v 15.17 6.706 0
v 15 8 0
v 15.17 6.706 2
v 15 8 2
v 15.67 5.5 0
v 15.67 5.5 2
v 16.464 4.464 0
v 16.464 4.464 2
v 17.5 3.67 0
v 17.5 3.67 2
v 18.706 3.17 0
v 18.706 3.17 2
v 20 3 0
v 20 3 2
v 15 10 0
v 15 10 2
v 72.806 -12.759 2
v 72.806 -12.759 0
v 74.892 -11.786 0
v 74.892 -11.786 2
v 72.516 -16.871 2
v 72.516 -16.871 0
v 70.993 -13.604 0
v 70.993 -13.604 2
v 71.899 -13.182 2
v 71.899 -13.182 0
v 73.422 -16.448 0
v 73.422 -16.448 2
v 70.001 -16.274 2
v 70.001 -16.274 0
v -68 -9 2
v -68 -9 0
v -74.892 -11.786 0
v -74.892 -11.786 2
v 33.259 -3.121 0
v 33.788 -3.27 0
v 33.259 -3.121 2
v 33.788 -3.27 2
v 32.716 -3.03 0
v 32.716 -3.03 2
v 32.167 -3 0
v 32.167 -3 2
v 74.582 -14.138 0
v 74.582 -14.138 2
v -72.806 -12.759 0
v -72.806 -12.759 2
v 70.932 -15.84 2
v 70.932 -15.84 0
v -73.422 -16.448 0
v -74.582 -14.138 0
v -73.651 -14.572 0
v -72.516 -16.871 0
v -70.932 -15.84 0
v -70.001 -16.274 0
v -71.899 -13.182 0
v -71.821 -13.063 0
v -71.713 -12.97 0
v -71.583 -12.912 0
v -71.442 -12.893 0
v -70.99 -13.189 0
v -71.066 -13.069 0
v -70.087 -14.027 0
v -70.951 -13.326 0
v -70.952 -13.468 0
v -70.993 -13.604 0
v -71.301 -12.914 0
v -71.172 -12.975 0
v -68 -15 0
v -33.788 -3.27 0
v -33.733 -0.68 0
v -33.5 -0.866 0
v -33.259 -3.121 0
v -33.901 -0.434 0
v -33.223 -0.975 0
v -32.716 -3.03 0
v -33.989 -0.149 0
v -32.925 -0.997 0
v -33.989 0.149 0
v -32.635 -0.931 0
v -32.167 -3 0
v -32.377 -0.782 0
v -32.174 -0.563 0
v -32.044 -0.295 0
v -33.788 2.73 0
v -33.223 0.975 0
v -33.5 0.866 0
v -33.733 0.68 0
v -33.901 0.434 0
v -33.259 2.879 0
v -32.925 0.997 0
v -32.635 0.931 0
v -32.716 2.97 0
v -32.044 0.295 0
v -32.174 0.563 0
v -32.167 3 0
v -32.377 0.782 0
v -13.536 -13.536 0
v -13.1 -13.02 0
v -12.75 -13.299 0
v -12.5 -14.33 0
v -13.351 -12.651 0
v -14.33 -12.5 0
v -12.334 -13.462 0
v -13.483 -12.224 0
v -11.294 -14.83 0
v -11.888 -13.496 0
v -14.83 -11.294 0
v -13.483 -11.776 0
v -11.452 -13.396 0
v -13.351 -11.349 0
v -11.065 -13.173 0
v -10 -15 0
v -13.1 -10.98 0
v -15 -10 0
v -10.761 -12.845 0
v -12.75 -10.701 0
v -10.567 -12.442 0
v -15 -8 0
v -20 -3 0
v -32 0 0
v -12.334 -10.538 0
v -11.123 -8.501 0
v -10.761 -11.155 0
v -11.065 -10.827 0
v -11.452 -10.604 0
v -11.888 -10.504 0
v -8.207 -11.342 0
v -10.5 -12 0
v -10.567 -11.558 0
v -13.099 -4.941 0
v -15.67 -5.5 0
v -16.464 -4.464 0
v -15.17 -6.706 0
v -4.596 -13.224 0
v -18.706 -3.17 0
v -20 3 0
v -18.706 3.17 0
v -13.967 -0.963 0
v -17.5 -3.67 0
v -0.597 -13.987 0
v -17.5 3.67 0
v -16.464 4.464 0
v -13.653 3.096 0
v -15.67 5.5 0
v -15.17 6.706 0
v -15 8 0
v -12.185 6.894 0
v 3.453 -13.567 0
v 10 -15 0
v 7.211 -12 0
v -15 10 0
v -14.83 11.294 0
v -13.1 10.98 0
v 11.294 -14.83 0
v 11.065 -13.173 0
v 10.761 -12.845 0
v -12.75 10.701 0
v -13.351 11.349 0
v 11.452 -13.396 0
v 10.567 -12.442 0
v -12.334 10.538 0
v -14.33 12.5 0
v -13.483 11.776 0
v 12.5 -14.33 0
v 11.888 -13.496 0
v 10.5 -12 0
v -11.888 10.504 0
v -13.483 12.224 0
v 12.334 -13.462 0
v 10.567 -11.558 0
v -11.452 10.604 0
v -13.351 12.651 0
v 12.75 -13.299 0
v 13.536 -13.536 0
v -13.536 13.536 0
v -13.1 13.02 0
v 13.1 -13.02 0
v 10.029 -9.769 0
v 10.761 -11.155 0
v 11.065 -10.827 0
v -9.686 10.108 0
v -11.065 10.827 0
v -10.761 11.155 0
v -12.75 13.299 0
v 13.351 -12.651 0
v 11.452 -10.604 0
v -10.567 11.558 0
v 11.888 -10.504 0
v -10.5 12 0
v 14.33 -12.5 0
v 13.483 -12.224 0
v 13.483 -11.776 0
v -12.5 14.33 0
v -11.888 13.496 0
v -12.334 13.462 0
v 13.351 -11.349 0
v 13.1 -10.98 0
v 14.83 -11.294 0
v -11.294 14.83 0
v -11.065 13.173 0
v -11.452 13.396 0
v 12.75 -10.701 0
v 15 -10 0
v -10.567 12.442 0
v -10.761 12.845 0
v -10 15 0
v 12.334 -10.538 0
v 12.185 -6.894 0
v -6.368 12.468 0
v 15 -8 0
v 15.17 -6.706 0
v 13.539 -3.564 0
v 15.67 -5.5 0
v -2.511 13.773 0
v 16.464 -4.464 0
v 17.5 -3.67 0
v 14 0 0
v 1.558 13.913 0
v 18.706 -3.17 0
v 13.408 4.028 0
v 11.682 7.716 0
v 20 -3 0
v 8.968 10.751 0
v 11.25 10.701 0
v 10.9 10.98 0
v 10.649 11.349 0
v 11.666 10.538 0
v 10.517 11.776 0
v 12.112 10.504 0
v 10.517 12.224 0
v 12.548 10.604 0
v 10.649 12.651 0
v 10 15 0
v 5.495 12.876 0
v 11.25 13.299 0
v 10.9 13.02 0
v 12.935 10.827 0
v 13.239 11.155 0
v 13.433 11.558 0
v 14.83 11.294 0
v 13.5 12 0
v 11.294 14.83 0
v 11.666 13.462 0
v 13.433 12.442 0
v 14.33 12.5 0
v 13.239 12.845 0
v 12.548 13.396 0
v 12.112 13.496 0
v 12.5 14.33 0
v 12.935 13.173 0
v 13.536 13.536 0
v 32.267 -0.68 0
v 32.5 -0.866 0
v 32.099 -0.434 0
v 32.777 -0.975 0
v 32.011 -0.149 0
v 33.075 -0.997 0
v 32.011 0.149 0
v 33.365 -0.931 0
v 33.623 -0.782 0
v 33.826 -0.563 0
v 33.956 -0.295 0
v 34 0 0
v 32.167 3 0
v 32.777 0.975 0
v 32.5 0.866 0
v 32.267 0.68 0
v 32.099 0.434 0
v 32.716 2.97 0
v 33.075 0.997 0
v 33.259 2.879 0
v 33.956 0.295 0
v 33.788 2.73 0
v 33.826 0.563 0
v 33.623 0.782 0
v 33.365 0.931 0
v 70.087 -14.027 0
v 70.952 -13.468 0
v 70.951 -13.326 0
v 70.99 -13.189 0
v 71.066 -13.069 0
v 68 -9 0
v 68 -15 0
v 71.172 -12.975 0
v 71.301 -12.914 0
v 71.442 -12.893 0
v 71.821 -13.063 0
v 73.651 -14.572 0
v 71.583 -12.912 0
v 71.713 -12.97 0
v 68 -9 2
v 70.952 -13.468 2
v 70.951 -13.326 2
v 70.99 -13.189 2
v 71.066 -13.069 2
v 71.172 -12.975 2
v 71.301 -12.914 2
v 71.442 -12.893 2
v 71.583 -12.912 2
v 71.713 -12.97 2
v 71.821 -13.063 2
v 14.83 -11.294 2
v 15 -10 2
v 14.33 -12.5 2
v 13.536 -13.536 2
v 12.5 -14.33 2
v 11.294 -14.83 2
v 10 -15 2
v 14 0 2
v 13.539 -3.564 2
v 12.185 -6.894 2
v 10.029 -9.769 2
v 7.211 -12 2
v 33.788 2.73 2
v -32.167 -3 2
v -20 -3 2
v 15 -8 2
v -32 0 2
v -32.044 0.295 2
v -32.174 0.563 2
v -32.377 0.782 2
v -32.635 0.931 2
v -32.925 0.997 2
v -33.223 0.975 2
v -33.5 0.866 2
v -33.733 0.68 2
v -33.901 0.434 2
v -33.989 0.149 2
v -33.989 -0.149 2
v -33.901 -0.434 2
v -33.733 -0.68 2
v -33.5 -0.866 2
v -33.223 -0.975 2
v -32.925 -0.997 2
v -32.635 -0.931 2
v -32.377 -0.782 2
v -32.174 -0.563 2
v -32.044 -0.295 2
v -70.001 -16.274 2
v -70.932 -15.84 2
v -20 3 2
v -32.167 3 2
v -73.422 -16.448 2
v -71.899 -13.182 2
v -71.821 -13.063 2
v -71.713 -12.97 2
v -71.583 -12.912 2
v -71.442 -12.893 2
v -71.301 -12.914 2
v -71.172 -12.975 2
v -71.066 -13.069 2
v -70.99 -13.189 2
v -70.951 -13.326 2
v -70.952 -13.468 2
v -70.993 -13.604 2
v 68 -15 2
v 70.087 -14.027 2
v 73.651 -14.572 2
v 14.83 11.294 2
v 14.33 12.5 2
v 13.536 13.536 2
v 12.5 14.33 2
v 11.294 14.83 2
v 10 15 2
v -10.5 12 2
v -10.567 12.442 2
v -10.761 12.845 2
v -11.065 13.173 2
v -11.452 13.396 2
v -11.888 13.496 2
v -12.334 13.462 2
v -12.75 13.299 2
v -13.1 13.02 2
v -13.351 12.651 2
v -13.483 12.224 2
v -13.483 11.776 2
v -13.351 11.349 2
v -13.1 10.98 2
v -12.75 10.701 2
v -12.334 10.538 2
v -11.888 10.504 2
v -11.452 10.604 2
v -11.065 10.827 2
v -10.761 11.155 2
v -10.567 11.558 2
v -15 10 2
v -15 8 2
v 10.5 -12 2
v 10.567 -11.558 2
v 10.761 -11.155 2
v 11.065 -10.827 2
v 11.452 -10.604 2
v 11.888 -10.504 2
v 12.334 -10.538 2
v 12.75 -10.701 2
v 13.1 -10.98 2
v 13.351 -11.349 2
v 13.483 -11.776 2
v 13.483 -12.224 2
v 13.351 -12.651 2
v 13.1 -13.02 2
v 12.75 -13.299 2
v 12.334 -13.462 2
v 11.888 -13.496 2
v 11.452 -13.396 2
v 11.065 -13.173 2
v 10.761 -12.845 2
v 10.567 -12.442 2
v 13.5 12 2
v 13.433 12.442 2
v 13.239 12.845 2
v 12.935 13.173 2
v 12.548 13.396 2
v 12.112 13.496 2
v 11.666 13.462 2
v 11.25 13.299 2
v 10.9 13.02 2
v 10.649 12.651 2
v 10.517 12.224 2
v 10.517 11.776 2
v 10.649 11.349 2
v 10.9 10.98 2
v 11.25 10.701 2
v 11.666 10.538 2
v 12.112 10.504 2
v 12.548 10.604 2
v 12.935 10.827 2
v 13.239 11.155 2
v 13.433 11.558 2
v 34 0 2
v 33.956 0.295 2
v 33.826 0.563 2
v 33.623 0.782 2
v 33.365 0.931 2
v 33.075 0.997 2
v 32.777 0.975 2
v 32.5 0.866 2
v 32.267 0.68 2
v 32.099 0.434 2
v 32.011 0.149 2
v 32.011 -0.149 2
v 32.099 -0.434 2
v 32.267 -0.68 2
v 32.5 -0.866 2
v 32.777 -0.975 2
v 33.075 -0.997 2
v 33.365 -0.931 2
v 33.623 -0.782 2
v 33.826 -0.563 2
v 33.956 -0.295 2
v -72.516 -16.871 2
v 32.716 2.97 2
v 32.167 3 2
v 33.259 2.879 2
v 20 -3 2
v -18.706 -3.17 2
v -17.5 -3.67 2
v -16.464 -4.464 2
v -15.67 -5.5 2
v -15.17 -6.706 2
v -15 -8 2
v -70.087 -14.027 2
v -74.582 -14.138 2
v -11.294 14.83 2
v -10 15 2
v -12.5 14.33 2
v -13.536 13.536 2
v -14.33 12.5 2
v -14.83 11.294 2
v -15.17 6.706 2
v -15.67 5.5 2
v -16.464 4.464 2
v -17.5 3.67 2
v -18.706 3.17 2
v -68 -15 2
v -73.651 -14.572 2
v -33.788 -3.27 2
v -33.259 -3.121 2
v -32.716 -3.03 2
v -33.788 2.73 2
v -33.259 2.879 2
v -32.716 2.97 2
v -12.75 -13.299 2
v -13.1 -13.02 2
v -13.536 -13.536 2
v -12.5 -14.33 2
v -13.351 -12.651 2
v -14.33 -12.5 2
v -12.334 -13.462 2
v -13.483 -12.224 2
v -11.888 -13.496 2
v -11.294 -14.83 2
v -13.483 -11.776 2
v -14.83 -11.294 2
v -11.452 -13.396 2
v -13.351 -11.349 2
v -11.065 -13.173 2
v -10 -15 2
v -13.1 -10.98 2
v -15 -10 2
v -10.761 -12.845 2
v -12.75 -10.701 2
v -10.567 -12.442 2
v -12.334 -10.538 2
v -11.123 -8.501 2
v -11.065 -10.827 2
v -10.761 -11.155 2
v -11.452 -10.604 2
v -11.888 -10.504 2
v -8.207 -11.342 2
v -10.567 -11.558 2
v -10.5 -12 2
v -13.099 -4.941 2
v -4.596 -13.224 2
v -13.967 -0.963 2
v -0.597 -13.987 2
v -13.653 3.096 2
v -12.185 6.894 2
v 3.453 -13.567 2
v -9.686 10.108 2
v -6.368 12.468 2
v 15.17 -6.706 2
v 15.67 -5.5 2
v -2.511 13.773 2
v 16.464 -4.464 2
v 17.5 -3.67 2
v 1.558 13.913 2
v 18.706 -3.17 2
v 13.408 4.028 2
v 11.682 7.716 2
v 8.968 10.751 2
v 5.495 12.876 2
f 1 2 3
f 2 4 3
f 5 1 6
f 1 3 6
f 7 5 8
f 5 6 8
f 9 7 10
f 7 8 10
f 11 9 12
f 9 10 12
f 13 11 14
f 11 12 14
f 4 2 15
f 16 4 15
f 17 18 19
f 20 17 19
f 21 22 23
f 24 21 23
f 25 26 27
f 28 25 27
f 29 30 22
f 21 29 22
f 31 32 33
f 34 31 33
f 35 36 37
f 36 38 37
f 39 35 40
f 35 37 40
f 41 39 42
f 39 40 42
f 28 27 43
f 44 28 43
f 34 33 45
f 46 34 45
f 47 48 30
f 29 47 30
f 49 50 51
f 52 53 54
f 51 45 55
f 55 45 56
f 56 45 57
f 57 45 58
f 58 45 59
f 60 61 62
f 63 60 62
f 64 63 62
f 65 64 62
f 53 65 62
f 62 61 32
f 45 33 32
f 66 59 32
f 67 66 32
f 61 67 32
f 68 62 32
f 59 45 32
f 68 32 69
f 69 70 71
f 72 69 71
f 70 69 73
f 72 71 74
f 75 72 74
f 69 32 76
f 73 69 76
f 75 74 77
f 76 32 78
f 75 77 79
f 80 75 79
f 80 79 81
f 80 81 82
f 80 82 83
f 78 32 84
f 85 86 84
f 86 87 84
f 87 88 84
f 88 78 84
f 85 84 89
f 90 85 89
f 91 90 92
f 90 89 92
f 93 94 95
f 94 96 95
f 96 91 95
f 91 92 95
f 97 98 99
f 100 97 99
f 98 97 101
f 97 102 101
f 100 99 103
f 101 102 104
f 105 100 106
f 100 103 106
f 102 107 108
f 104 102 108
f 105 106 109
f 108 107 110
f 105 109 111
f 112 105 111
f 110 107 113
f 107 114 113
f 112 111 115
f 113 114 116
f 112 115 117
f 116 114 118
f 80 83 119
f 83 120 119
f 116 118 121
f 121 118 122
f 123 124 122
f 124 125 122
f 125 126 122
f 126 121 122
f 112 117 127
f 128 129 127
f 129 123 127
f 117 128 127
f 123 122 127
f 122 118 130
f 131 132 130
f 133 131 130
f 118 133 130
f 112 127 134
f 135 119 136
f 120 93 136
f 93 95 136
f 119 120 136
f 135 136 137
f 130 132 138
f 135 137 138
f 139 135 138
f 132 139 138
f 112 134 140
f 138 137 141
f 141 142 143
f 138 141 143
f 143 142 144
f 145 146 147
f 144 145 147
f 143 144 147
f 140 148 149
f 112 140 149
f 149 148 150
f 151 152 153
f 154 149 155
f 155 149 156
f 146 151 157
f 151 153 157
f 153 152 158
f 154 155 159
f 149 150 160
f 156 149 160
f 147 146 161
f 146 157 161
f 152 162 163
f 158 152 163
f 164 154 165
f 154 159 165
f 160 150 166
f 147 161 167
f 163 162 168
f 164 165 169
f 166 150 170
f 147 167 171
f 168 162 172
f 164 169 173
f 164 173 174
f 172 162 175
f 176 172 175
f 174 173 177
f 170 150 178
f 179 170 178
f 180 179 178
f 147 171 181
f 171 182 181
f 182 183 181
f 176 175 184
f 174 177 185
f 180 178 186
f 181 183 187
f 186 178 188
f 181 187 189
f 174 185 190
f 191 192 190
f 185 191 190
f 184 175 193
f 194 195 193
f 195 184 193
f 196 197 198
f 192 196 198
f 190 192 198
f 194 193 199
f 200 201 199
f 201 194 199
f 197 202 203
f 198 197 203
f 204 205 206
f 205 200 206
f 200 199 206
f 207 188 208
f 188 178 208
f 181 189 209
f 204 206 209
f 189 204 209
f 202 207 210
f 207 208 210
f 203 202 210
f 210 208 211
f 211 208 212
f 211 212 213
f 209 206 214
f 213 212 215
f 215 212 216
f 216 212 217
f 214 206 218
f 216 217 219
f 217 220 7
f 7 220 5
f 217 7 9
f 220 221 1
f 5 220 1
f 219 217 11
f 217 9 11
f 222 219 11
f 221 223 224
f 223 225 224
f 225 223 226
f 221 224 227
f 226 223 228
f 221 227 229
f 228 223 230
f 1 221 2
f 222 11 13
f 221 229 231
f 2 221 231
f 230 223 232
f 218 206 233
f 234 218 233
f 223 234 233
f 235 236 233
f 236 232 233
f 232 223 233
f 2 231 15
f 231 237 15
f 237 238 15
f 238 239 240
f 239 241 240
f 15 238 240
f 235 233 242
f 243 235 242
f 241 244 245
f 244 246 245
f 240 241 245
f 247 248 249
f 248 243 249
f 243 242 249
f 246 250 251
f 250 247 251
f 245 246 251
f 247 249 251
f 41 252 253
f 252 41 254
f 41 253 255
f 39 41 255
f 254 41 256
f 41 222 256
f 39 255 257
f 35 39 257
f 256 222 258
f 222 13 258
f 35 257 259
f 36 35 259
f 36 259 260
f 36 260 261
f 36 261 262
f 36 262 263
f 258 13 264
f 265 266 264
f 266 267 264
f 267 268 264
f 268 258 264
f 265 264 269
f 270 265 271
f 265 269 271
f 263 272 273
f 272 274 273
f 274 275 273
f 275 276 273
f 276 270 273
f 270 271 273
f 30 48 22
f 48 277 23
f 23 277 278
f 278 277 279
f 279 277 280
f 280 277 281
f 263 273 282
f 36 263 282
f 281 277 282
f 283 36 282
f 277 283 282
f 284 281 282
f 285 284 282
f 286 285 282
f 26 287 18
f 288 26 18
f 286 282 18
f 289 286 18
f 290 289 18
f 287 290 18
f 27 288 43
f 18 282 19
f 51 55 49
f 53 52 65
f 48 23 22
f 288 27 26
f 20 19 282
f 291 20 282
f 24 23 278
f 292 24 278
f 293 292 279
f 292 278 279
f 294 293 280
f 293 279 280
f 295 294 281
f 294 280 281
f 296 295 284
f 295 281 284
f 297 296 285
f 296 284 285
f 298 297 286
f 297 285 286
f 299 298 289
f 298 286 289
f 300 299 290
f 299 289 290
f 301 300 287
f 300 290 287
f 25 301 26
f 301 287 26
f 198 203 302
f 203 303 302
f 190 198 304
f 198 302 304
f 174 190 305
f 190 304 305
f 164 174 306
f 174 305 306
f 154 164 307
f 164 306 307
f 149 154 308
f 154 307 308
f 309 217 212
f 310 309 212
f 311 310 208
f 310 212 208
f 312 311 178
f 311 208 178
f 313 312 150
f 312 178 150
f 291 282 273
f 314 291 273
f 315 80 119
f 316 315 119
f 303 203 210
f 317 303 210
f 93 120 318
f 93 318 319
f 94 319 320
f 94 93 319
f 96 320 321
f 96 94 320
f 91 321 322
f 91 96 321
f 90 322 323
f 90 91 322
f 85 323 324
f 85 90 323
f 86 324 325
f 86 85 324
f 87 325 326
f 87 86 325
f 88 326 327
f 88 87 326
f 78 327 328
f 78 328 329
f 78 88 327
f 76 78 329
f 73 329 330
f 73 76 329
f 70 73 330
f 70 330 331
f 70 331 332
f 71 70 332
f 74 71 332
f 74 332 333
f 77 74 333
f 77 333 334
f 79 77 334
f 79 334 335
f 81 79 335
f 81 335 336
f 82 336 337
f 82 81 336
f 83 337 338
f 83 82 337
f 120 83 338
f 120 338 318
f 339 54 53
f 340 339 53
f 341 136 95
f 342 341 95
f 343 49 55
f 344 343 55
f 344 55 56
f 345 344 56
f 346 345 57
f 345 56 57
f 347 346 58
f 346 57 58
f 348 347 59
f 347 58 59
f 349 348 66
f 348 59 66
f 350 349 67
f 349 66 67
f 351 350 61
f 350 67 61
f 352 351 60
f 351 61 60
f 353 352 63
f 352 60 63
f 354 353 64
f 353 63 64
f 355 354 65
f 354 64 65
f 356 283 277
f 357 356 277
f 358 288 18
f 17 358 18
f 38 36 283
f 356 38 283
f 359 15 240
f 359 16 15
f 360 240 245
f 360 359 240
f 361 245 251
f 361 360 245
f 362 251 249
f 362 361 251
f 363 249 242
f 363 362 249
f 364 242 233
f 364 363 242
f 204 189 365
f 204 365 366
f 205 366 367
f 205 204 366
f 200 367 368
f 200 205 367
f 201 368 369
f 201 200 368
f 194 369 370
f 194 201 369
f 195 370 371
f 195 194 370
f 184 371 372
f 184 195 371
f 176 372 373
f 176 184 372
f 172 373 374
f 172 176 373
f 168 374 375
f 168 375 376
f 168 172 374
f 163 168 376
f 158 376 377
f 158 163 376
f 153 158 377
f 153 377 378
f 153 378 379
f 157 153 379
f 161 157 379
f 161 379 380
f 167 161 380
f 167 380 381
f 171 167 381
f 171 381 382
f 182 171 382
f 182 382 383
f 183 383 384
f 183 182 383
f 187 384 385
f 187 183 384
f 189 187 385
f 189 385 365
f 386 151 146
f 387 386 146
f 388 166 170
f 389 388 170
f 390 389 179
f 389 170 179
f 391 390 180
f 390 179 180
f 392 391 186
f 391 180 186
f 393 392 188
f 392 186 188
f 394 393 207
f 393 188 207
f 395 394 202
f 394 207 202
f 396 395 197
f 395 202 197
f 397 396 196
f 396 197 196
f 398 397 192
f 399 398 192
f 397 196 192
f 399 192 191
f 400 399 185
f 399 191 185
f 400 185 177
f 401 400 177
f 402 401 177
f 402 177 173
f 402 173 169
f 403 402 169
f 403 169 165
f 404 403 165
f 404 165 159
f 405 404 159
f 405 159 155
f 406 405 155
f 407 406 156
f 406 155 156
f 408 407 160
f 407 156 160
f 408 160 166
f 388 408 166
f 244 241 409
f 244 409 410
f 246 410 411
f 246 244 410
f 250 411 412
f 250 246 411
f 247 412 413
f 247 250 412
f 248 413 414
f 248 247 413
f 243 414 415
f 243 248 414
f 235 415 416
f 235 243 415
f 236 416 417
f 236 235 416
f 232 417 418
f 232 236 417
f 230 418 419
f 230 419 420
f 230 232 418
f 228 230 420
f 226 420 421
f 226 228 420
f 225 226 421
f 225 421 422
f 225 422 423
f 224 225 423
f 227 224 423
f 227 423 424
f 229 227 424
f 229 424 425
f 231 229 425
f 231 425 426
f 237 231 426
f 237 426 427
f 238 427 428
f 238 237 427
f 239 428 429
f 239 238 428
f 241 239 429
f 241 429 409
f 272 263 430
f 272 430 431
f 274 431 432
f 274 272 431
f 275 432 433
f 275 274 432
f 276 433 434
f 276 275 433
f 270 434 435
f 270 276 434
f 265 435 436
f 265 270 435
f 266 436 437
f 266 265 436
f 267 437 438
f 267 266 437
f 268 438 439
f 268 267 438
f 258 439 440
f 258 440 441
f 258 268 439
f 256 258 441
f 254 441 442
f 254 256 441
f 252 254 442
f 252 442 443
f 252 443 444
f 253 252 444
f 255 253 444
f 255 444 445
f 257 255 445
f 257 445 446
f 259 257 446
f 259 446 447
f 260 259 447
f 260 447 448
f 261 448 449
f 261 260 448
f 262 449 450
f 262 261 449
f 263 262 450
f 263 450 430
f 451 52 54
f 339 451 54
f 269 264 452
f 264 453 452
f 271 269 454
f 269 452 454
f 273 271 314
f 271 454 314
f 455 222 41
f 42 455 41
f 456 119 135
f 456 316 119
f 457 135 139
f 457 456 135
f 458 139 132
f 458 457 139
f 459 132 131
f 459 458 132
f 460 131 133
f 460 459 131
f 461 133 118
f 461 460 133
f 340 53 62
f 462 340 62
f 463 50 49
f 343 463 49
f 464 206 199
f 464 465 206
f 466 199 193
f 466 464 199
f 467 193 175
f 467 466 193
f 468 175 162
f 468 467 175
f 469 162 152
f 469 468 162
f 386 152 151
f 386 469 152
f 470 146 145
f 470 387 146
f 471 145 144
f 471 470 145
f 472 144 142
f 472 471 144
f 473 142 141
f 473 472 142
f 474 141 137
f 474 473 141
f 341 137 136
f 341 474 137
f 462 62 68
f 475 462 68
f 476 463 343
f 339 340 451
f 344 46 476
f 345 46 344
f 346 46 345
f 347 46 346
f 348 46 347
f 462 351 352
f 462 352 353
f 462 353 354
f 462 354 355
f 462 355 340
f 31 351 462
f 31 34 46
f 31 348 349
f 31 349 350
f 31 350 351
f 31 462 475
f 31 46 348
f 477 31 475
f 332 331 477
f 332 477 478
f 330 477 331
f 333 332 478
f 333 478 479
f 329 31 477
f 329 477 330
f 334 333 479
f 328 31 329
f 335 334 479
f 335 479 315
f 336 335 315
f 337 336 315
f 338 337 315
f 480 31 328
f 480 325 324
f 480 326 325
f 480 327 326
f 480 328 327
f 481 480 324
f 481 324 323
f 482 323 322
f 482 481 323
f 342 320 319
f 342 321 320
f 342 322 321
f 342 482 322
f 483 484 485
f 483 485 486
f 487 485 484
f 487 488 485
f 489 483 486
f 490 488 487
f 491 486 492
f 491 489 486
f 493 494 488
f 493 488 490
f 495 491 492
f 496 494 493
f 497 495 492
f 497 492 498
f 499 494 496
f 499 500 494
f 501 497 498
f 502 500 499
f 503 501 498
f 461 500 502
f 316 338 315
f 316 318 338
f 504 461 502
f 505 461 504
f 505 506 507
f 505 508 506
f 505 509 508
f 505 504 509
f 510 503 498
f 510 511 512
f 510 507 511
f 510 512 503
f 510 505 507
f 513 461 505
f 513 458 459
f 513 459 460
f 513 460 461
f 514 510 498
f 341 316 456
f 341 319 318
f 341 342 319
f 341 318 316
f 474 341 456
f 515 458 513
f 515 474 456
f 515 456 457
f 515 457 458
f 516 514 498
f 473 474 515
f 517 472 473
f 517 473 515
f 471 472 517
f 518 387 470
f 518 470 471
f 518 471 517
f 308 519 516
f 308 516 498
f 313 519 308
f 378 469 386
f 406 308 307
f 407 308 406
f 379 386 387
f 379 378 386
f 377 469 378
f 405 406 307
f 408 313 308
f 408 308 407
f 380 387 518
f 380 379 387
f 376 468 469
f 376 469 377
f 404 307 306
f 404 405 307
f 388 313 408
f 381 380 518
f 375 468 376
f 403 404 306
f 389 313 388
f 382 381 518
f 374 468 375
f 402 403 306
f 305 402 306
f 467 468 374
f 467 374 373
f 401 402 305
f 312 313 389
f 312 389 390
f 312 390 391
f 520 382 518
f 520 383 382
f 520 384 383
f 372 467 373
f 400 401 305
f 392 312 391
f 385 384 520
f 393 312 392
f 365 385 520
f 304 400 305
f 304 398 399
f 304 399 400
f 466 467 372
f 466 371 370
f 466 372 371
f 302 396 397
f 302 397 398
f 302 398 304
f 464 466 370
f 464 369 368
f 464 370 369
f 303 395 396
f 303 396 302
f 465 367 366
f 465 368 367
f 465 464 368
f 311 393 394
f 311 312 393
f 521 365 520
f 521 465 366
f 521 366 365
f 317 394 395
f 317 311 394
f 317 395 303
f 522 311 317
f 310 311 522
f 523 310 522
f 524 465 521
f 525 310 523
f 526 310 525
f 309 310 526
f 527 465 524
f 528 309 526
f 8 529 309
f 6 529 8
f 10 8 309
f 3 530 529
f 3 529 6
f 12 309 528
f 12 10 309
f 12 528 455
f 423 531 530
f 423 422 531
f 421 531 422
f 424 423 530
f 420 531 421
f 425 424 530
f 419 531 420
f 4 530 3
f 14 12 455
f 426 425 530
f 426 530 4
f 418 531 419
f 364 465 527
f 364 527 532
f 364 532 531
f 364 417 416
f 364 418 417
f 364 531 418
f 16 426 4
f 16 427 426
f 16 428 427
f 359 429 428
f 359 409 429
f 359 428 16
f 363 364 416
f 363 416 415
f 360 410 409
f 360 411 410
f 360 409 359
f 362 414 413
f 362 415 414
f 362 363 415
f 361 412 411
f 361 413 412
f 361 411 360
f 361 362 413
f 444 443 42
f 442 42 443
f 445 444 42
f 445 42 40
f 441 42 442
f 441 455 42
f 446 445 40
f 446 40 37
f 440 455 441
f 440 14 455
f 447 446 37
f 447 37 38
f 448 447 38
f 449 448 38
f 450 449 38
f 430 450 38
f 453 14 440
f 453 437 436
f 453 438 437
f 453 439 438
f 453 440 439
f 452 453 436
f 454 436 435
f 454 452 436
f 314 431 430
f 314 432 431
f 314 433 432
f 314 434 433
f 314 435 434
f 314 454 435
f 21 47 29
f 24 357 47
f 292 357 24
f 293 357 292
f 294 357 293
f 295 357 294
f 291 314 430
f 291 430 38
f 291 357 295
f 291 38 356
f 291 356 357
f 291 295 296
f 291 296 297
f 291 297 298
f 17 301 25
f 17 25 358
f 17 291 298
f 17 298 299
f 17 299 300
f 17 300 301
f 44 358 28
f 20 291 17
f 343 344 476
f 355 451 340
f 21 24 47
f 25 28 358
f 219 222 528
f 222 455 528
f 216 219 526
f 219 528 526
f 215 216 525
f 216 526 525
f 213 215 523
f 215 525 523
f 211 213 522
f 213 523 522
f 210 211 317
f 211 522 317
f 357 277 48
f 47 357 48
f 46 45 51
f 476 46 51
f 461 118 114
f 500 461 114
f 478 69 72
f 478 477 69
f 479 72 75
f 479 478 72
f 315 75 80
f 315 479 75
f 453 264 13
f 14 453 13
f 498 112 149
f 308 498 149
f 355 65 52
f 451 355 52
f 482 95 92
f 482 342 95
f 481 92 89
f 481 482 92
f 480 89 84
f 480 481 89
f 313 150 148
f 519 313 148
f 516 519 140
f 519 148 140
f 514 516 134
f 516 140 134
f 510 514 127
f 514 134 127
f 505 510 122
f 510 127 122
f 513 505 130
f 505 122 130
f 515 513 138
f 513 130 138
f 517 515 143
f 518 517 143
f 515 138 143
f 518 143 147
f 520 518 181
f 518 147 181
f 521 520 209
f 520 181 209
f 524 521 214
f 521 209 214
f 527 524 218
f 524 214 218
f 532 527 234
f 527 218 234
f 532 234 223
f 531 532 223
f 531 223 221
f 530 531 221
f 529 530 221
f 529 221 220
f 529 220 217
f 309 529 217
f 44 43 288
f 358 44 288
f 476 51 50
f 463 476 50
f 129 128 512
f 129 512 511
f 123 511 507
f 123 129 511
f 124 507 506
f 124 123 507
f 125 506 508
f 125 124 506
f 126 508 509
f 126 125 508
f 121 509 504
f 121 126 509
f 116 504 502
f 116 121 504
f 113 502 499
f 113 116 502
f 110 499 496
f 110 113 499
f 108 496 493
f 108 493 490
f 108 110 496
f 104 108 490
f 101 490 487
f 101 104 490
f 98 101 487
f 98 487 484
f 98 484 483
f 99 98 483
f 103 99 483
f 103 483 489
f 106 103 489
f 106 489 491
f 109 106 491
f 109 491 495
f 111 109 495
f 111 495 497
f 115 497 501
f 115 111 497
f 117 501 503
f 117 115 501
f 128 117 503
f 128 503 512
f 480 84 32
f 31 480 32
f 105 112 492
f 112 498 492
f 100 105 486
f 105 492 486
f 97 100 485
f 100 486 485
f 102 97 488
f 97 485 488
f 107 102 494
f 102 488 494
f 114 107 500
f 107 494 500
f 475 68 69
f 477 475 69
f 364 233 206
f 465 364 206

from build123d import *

# Parameters (mm, degrees)
F0_R     = 1.5
F0_R_2   = 1
F1_DEPTH = 2
F2_R     = 5


with BuildPart() as f1:
    # F0 (on Top) → F1 (new body)
    with BuildSketch(Plane.XY):
        with BuildLine():
            ThreePointArc((13.5, -12), (12, -10.5), (10.5, -12))
            ThreePointArc((10.5, -12), (12, -13.5), (13.5, -12))
        make_face()
        with BuildLine():
            Line((15, 3), (15, 15))
            Line((15, 15), (-15, 15))
            Line((-15, 15), (-15, 3))
            Line((-15, 3), (-33, 3))
            Line((-33, 3), (-68, -9))
            Line((-68, -9), (-74.892196, -11.786116))
            Line((-74.892196, -11.786116), (-72.80556, -12.759131))
            Line((-72.80556, -12.759131), (-73.650796, -14.571746))
            Line((-73.650796, -14.571746), (-74.581683, -14.137667))
            Line((-74.581683, -14.137667), (-73.422492, -16.448347))
            Line((-73.422492, -16.448347), (-71.899252, -13.181749))
            ThreePointArc((-71.899252, -13.181749), (-71.234789, -12.939904), (-70.992944, -13.604367))
            Line((-70.992944, -13.604367), (-72.516184, -16.870966))
            Line((-72.516184, -16.870966), (-70.000987, -16.27368))
            Line((-70.000987, -16.27368), (-70.931873, -15.839601))
            Line((-70.931873, -15.839601), (-70.086637, -14.026985))
            Line((-70.086637, -14.026985), (-68, -15))
            Line((-68, -15), (-33, -3))
            Line((-33, -3), (-15, -3))
            Line((-15, -3), (-15, -15))
            Line((-15, -15), (15, -15))
            Line((15, -15), (15, -3))
            Line((15, -3), (33, -3))
            Line((33, -3), (68, -15))
            Line((68, -15), (70.086637, -14.026985))
            Line((70.086637, -14.026985), (70.931873, -15.839601))
            Line((70.931873, -15.839601), (70.000987, -16.27368))
            Line((70.000987, -16.27368), (72.516184, -16.870966))
            Line((72.516184, -16.870966), (70.992944, -13.604367))
            ThreePointArc((70.992944, -13.604367), (71.234789, -12.939904), (71.899252, -13.181749))
            Line((71.899252, -13.181749), (73.422492, -16.448347))
            Line((73.422492, -16.448347), (74.581683, -14.137667))
            Line((74.581683, -14.137667), (73.650796, -14.571746))
            Line((73.650796, -14.571746), (72.80556, -12.759131))
            Line((72.80556, -12.759131), (74.892196, -11.786116))
            Line((74.892196, -11.786116), (68, -9))
            Line((68, -9), (33, 3))
            Line((33, 3), (15, 3))
        make_face()
        with Locations((-12, -12)):
            Circle(F0_R, mode=Mode.SUBTRACT)
        with BuildLine():
            ThreePointArc((13.5, -12), (12, -13.5), (10.5, -12))
            ThreePointArc((10.5, -12), (12, -10.5), (13.5, -12))
        make_face(mode=Mode.SUBTRACT)
        with Locations((-33, 0)):
            Circle(F0_R_2, mode=Mode.SUBTRACT)
        with Locations((-12, 12)):
            Circle(F0_R, mode=Mode.SUBTRACT)
        with BuildLine():
            ThreePointArc((14, 0), (12.185143, -6.893641), (7.211103, -12))
            ThreePointArc((7.211103, -12), (-12.185143, 6.893641), (14, 0))
        make_face(mode=Mode.SUBTRACT)
        with Locations((33, 0)):
            Circle(F0_R_2, mode=Mode.SUBTRACT)
        with Locations((12, 12)):
            Circle(F0_R, mode=Mode.SUBTRACT)
    extrude(amount=F1_DEPTH)

    # F2
    f2_edges = [f1.edges().sort_by_distance(p)[0] for p in [
        (33, -3, 1),
        (33, 3, 1),
        (15, 3, 1),
        (15, -3, 1),
        (15, -15, 1),
        (15, 15, 1),
        (-15, 15, 1),
        (-33, 3, 1),
        (-15, -15, 1),
        (-33, -3, 1),
        (-15, -3, 1),
        (-15, 3, 1),
    ]]
    fillet(f2_edges, radius=F2_R)


solid = f1.part
